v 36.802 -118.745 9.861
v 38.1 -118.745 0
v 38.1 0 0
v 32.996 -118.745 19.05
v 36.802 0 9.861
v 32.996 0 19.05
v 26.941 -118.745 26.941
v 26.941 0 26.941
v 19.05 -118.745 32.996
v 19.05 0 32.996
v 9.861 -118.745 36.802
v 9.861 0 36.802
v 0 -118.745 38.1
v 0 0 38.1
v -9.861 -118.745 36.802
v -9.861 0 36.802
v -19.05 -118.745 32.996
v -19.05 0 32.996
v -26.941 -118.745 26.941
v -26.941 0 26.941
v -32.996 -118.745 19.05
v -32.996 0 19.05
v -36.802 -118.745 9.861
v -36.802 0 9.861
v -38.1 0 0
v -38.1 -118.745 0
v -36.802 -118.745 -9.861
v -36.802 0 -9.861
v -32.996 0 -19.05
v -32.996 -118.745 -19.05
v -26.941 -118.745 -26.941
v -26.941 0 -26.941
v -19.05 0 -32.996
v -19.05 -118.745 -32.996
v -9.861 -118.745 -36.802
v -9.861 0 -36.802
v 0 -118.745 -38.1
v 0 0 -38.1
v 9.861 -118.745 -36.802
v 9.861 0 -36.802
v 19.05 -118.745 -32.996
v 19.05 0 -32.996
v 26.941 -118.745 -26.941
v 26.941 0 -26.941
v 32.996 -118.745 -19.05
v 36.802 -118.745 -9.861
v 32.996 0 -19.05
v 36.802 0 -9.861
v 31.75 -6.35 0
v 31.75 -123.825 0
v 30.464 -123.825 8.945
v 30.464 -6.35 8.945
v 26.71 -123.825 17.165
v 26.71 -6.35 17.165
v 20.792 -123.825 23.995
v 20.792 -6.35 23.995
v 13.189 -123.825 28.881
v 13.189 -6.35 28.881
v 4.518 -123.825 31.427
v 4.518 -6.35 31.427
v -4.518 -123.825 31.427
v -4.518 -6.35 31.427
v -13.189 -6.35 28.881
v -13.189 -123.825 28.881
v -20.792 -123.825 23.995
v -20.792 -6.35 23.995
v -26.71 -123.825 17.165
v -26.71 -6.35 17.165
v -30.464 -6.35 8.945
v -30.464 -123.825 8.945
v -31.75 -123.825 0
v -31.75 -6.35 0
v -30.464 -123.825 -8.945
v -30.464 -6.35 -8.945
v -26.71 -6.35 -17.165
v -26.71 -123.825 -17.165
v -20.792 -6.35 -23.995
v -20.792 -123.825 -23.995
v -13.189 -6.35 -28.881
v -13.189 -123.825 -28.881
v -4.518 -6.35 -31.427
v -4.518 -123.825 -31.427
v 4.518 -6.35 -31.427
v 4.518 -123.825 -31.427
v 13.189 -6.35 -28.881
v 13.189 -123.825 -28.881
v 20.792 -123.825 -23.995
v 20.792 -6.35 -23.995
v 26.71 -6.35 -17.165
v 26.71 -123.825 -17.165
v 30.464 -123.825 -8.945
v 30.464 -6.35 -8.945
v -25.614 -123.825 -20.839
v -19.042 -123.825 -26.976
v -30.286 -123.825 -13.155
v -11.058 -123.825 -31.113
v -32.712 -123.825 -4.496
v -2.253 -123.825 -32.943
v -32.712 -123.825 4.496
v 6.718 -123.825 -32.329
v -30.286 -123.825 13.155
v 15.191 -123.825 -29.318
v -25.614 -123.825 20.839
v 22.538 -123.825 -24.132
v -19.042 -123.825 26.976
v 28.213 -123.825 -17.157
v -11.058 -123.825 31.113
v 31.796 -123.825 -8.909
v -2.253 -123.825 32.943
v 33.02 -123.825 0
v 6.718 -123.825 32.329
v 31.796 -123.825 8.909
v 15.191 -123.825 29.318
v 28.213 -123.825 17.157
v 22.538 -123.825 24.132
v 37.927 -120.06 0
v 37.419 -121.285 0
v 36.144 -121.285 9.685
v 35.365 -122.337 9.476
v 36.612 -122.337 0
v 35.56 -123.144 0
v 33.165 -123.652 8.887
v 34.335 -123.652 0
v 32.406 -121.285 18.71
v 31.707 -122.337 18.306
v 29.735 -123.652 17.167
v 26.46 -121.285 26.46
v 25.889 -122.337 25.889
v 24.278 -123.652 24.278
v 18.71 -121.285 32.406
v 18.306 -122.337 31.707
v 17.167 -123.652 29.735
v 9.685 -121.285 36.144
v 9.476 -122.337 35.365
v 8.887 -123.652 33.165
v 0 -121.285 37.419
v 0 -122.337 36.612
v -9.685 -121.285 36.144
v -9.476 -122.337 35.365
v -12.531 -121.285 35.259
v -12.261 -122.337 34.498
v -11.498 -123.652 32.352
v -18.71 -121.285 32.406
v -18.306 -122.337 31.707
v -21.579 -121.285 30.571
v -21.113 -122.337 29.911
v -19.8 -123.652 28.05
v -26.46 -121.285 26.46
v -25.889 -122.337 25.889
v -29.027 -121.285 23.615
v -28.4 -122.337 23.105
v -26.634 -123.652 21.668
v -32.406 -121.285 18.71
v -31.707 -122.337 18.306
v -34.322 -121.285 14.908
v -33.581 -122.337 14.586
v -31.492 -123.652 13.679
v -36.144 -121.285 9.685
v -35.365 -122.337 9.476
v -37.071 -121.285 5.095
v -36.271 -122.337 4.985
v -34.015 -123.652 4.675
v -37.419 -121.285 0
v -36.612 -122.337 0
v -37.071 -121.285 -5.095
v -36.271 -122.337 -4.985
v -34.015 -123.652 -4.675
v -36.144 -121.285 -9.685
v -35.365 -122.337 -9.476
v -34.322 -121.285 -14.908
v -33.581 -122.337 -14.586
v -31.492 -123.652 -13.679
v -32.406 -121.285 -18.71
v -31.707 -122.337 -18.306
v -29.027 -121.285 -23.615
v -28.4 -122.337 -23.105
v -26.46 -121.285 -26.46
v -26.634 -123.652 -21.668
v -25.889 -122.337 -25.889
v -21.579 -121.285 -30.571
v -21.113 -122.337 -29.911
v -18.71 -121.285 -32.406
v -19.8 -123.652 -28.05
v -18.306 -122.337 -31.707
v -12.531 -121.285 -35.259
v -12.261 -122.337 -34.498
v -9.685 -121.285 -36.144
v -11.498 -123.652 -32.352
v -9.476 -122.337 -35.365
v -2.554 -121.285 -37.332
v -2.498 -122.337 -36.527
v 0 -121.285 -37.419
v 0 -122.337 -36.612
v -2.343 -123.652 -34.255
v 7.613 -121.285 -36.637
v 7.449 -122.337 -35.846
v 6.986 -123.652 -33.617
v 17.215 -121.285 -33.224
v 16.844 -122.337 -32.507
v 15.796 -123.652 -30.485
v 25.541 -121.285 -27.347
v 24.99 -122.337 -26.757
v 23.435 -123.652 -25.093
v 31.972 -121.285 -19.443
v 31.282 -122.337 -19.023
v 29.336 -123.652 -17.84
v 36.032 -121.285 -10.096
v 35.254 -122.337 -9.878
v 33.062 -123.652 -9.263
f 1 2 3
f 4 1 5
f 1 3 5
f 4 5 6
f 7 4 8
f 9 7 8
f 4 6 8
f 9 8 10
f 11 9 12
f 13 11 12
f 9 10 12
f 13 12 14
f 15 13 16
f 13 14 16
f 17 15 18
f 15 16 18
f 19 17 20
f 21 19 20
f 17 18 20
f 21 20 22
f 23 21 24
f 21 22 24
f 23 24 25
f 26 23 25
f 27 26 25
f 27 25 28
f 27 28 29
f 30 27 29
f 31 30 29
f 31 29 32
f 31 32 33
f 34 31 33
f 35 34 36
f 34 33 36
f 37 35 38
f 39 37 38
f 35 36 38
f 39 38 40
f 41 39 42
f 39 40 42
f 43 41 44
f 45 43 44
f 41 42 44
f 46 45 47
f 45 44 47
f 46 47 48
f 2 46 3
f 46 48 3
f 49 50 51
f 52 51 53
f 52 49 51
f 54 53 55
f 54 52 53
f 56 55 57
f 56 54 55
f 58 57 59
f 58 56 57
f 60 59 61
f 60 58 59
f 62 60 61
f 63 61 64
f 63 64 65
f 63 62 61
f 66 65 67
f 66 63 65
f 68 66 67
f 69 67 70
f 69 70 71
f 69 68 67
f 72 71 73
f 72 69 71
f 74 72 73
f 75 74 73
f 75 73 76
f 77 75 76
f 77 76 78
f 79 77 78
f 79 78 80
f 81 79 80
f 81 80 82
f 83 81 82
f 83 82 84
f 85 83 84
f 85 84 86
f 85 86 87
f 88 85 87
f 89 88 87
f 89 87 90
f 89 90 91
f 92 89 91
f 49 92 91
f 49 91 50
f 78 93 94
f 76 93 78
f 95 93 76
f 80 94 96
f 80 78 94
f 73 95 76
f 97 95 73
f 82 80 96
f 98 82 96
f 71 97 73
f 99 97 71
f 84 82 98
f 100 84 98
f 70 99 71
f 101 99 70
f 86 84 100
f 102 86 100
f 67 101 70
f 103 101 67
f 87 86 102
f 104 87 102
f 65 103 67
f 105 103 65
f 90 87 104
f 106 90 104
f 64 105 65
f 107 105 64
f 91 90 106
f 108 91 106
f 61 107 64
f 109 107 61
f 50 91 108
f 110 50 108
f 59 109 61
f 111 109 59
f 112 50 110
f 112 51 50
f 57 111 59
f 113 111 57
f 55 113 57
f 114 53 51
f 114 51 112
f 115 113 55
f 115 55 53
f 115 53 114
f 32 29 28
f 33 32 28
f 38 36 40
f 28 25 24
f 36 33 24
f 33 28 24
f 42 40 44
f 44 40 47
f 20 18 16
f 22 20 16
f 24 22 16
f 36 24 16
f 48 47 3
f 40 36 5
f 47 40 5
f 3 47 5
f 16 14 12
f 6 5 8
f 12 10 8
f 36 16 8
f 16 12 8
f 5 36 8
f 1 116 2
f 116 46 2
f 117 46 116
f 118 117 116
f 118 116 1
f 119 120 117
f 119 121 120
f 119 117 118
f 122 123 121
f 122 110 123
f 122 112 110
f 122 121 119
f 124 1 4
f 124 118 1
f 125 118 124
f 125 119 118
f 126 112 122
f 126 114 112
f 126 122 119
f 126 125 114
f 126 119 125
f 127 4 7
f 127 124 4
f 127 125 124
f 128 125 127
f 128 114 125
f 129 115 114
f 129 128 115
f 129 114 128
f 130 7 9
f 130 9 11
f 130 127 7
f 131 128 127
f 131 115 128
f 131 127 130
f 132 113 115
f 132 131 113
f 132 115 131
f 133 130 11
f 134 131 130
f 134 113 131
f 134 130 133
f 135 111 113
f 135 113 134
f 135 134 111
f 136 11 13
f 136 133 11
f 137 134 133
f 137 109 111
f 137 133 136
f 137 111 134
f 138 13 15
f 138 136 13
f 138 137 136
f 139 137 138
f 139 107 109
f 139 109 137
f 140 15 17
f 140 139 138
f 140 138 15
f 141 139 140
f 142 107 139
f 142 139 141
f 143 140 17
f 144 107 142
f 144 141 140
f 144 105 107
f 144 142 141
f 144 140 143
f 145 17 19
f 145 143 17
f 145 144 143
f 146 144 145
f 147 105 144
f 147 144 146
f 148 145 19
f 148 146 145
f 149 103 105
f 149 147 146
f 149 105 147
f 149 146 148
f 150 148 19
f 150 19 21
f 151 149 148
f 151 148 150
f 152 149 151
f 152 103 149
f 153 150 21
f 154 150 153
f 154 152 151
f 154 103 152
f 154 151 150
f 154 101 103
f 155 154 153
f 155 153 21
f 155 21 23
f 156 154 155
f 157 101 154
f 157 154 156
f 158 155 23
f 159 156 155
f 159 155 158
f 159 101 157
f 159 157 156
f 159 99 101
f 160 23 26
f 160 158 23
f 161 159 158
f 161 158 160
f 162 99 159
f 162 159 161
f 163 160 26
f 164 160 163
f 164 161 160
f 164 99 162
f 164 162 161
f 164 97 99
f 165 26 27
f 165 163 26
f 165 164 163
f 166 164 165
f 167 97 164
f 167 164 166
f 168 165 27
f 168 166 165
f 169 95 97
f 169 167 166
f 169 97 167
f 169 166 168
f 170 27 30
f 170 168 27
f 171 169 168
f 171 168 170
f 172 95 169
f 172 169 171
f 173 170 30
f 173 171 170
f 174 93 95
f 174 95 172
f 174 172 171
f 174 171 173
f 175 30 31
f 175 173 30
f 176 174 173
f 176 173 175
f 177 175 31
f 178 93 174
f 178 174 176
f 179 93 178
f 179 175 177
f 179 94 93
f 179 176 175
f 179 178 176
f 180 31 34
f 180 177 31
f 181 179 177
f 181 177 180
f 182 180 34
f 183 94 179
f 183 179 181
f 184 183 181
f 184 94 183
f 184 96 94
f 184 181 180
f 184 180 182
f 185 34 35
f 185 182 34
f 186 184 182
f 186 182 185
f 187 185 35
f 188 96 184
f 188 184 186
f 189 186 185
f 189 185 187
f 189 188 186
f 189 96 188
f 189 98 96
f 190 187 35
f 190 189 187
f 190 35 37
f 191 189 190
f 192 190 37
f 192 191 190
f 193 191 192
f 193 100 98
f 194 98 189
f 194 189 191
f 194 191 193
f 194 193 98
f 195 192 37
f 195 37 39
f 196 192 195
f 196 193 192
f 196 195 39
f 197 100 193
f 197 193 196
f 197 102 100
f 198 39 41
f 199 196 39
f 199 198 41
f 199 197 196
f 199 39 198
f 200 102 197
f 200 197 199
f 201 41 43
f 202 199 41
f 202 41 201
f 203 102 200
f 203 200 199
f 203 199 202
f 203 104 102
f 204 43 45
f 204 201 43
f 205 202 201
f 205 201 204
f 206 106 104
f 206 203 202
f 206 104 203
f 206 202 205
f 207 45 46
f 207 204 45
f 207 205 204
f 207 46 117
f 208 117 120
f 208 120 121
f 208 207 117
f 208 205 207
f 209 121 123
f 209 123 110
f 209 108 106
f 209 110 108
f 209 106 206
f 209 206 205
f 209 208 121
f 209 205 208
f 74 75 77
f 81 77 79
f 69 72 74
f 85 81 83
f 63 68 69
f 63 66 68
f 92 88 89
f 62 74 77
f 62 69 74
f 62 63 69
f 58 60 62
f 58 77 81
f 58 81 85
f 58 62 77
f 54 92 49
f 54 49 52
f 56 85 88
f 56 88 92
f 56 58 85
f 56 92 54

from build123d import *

# Parameters (mm, degrees)
F0_R     = 38.1
F0_R_2   = 31.75
F1_DEPTH = 123.825
F2_R     = 38.1
F3_DEPTH = 6.35
F4_R     = 5.08


with BuildPart() as f1:
    # F0 (on Front) → F1 (new body)
    with BuildSketch(Plane.XZ):
        Circle(F0_R)
        Circle(F0_R_2, mode=Mode.SUBTRACT)
    extrude(amount=F1_DEPTH)

    # F2 (on Front) → F3 (join)
    with BuildSketch(Plane.XZ):
        Circle(F2_R)
    extrude(amount=F3_DEPTH)

    # F4
    f4_edges = [f1.edges().sort_by_distance(p)[0] for p in [
        (-38.1, -123.825, 0),
    ]]
    fillet(f4_edges, radius=F4_R)


solid = f1.part
